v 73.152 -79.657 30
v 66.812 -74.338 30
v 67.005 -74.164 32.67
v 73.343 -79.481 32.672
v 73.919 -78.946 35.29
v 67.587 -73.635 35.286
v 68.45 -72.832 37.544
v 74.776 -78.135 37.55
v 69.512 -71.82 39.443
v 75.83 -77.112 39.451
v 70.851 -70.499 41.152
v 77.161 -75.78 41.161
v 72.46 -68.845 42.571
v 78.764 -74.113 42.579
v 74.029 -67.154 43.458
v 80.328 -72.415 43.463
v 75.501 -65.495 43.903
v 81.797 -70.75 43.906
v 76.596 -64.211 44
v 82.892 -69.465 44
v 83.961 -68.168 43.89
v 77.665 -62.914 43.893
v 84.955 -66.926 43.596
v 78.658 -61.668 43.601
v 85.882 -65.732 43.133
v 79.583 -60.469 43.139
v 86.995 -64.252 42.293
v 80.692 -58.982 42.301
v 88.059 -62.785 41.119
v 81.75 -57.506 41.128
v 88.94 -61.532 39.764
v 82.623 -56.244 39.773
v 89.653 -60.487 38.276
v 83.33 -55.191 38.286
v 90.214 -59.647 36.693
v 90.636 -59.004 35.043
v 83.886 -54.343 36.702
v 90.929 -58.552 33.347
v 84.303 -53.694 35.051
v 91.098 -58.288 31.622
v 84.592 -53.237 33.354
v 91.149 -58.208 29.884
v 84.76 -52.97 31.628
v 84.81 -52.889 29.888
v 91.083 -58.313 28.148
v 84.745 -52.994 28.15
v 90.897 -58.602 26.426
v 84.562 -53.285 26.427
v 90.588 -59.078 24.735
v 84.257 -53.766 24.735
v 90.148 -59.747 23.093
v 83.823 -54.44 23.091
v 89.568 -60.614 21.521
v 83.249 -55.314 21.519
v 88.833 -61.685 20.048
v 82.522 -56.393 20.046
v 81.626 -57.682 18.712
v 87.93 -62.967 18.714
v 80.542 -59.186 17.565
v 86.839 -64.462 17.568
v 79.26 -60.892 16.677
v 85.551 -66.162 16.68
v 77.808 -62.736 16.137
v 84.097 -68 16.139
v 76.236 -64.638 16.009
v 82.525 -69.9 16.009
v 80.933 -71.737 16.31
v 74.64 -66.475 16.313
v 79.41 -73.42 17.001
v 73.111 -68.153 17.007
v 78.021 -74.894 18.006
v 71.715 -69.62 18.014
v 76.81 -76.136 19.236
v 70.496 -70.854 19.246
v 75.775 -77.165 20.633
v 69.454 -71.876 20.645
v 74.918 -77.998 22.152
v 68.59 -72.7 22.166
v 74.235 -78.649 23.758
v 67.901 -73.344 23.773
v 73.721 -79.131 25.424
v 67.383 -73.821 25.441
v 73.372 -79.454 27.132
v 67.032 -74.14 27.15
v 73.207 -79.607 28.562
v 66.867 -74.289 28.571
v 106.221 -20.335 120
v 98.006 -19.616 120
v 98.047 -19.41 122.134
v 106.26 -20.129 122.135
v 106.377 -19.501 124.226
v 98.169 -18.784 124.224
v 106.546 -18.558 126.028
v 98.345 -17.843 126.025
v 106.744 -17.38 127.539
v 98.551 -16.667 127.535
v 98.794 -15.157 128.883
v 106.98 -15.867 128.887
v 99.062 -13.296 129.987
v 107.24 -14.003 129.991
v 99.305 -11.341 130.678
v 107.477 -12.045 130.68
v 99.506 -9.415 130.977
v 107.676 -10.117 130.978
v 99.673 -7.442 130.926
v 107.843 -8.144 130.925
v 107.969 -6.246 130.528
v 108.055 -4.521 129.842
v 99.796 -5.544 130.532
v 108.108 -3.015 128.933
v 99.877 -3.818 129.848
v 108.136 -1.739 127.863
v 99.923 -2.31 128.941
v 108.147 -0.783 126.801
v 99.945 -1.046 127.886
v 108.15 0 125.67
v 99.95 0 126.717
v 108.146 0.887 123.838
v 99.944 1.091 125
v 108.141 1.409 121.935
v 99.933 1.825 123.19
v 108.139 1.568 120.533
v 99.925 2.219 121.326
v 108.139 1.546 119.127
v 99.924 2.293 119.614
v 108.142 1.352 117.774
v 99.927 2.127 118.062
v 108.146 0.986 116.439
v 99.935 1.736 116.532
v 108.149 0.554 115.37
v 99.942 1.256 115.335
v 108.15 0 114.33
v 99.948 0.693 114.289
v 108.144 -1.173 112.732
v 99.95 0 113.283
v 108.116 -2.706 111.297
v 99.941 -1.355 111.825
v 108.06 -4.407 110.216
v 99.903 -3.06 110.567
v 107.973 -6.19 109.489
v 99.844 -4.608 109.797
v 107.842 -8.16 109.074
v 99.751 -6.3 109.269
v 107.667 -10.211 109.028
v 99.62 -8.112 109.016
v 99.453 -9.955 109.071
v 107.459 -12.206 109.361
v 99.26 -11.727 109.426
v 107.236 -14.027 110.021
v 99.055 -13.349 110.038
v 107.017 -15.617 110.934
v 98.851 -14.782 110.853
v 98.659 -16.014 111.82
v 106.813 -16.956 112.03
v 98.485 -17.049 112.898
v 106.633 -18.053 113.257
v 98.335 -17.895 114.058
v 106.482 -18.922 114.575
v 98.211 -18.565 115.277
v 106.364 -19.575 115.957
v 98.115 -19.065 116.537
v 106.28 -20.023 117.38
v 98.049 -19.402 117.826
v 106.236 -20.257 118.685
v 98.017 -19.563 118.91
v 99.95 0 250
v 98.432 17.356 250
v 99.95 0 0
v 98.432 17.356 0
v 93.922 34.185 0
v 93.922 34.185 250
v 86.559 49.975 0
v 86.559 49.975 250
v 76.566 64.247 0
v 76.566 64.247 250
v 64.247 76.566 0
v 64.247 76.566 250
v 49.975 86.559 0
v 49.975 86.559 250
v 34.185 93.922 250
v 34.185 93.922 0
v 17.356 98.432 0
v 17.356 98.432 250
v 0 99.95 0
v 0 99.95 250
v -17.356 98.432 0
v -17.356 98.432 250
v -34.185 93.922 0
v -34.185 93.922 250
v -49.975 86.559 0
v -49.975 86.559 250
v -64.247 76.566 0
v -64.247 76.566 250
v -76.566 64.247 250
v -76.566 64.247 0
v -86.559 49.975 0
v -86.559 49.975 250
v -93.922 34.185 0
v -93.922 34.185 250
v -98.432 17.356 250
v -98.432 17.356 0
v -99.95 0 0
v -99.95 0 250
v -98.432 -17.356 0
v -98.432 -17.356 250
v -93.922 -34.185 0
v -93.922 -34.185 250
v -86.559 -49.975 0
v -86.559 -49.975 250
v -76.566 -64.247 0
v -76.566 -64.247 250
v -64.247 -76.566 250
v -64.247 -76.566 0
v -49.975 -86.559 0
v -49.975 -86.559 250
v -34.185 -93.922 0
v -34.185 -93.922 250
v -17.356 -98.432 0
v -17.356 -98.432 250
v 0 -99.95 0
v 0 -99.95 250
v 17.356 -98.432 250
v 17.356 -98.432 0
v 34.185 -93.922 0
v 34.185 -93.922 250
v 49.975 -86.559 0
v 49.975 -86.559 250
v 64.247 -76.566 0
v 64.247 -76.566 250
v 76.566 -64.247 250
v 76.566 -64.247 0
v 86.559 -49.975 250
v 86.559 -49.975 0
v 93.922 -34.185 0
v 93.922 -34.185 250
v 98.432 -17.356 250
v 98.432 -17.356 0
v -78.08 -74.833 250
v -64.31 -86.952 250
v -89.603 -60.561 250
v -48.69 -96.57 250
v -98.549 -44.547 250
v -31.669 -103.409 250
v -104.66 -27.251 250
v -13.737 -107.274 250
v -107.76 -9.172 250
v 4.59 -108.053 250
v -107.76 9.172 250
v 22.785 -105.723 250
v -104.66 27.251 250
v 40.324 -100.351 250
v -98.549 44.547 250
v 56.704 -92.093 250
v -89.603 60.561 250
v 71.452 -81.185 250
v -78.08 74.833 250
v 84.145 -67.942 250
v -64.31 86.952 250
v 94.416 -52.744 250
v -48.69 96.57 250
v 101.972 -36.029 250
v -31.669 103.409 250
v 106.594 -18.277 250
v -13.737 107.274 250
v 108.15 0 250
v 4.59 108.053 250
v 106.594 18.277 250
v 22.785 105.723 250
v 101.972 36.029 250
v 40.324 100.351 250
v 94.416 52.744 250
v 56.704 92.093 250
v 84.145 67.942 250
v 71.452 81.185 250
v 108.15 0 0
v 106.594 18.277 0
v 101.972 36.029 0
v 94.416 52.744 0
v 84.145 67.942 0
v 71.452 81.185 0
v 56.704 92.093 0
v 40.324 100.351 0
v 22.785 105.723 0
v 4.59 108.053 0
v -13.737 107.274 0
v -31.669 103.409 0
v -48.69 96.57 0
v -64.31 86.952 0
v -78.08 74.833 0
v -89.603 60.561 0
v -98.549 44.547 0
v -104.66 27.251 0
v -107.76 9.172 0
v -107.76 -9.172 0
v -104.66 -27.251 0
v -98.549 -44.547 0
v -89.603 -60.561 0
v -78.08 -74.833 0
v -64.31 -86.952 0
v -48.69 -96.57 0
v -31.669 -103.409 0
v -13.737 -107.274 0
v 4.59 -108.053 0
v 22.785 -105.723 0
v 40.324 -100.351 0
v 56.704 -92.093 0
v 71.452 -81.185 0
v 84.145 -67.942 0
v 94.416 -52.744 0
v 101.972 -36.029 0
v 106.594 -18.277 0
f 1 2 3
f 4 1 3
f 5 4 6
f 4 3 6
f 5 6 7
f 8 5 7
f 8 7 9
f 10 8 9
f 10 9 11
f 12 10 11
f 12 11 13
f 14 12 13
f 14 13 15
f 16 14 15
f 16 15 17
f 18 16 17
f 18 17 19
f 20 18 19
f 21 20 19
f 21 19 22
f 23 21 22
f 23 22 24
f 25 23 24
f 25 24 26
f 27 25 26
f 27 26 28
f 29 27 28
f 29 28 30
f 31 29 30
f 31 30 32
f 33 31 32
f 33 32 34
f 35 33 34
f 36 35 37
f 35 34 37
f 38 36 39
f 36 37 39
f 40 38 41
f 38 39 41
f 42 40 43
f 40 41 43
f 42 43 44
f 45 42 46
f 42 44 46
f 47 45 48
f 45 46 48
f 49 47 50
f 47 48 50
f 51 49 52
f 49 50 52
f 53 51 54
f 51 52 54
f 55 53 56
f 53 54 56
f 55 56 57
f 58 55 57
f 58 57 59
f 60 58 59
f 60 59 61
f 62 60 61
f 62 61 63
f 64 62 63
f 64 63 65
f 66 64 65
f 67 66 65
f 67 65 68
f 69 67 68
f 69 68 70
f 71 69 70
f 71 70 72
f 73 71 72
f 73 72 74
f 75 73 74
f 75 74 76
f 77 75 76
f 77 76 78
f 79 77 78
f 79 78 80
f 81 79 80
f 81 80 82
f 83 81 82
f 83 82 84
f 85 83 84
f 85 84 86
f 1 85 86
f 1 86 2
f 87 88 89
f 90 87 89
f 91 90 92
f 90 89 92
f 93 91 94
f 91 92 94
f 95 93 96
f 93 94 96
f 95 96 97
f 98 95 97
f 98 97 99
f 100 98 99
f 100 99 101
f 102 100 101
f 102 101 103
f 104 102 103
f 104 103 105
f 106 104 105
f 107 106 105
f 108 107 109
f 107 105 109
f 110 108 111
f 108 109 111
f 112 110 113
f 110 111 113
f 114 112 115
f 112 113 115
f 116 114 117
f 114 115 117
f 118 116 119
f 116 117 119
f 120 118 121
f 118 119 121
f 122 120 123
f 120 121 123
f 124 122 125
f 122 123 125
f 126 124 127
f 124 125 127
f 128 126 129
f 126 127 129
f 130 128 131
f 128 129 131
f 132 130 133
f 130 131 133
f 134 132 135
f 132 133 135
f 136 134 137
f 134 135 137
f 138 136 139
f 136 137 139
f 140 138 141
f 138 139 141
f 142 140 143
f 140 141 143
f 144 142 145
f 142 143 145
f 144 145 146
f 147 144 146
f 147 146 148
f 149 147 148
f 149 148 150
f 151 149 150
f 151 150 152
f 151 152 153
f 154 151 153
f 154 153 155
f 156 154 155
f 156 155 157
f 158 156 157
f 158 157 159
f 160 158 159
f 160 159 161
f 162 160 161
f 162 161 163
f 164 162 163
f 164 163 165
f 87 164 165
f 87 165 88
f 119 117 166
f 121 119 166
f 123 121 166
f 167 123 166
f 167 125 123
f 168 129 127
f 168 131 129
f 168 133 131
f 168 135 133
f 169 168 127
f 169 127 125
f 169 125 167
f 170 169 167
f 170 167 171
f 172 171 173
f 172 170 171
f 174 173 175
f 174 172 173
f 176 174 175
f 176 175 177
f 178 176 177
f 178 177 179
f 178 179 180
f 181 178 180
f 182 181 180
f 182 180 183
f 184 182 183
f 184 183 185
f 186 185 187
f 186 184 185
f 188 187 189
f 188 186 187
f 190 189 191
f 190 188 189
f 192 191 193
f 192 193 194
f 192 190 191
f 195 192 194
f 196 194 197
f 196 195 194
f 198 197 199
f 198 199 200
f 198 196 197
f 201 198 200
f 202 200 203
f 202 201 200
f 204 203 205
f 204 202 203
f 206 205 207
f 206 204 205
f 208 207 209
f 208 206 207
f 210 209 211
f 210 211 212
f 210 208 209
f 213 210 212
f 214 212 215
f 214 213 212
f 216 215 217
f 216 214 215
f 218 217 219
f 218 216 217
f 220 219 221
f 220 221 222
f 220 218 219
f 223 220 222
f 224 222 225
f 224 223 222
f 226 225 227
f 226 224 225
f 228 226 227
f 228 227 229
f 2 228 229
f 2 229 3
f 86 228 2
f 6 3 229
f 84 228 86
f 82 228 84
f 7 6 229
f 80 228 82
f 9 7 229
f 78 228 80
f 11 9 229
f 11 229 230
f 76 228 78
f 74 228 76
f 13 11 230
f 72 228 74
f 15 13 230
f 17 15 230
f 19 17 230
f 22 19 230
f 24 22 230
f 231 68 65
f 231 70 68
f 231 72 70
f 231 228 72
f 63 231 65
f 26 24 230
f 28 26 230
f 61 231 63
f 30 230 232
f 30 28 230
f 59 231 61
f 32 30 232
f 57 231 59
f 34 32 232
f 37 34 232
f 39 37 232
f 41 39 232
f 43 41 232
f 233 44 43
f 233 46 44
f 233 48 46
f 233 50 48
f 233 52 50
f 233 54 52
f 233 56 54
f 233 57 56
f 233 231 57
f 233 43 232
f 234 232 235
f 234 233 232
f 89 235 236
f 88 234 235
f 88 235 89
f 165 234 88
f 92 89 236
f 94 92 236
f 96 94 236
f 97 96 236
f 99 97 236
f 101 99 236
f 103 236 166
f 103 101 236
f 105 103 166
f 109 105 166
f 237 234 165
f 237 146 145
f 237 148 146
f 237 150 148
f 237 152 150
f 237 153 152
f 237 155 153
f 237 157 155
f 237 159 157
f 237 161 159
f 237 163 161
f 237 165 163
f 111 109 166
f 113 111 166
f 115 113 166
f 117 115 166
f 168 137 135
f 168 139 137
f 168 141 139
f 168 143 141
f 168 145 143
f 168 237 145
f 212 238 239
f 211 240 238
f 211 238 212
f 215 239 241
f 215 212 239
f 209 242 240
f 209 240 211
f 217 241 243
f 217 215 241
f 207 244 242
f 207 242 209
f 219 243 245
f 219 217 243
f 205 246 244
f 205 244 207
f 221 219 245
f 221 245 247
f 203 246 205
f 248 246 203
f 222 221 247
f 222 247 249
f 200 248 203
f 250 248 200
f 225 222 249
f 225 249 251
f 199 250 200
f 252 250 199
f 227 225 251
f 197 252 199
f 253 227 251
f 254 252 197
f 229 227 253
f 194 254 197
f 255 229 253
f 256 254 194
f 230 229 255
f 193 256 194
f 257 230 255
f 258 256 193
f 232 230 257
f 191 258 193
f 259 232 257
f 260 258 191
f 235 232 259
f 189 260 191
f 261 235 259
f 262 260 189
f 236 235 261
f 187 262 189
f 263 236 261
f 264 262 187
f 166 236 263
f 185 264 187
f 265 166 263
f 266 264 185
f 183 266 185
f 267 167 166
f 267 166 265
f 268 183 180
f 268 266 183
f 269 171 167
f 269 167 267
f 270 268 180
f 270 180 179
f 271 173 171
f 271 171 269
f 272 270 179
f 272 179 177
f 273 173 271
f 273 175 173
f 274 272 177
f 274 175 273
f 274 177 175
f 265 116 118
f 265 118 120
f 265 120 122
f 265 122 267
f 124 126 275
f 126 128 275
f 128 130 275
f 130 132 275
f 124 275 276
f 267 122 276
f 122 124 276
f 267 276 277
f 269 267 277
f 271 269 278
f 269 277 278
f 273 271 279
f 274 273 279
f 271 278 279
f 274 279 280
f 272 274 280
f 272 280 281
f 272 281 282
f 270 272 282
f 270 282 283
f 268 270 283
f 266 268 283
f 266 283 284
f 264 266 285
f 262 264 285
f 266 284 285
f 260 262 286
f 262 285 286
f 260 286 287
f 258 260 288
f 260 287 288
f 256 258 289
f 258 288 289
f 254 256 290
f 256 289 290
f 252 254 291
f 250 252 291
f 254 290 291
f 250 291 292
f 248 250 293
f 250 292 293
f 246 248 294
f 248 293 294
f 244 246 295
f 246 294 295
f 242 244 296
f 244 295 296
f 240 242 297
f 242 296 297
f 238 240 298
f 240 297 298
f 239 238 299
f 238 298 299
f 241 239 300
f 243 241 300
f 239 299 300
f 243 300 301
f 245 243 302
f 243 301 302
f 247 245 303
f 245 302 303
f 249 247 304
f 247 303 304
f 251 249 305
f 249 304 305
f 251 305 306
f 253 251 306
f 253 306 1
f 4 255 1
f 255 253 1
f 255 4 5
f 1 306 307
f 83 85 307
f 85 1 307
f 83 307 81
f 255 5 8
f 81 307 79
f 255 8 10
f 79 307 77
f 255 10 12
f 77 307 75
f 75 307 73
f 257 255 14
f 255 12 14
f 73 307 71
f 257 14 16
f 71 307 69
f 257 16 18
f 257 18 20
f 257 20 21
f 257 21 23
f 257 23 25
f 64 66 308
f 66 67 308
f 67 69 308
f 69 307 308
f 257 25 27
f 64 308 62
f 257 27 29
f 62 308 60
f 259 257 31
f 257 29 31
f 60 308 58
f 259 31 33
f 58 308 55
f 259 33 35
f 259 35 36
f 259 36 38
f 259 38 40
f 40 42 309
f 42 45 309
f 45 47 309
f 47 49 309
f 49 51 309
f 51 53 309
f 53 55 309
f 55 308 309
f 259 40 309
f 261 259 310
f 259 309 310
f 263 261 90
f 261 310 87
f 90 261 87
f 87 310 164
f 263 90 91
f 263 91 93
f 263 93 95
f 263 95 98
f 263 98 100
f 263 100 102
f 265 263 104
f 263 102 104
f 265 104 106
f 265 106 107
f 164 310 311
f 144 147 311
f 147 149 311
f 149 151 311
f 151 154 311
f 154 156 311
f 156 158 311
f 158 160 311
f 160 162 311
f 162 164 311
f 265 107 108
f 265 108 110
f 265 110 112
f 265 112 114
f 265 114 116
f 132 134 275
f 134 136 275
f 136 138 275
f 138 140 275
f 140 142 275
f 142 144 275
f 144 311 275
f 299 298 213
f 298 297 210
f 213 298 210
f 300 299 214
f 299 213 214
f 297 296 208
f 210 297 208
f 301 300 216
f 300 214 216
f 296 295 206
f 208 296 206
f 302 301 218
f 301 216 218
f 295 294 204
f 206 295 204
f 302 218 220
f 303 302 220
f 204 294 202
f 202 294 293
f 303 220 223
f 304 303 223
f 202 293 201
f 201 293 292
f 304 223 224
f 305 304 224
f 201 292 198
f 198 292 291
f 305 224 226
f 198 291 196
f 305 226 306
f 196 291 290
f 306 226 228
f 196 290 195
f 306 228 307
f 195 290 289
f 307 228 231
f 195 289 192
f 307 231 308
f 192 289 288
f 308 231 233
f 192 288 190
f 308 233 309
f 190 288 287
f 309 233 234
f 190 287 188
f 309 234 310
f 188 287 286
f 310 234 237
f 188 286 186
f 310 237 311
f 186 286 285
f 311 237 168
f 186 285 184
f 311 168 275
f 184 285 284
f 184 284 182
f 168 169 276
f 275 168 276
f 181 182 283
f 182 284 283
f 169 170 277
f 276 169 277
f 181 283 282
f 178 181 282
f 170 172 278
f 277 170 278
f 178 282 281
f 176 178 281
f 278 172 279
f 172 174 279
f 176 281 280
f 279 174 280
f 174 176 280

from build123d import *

# Parameters (mm, degrees)
F0_R     = 108.15
F0_R_2   = 99.95
F1_DEPTH = 250
F3_R     = 14
F4_REACH = 191.9641662574
F6_R     = 11
F7_REACH = 148.2780486573


with BuildPart() as f1:
    # F0 (on Top) → F1 (new body)
    with BuildSketch(Plane.XY):
        Circle(F0_R)
        Circle(F0_R_2, mode=Mode.SUBTRACT)
    extrude(amount=F1_DEPTH)

    f4_end = f1.faces().sort_by_distance((-108.15, 0, 125))[0]
    # F3 (on face) → F4 (cut, up to a face of the model that its end follows)
    with BuildSketch(Plane(origin=(0, 0, 0), x_dir=(-0.6427876097, -0.7660444431, 0), z_dir=(-0.7660444431, 0.6427876097, 0))):
        with Locations((0, 30)):
            Circle(F3_R)
    f4_long = extrude(amount=-F4_REACH, mode=Mode.PRIVATE)
    add(split(f4_long, bisect_by=f4_end, keep=Keep.BOTTOM, mode=Mode.PRIVATE), mode=Mode.SUBTRACT)

    f7_end = f1.faces().sort_by_distance((-108.15, 0, 125))[0]
    # F6 (on face) → F7 (cut, up to a face of the model that its end follows)
    with BuildSketch(Plane(origin=(0, 0, 0), x_dir=(-0.0871557427, -0.9961946981, 0), z_dir=(-0.9961946981, 0.0871557427, 0))):
        with Locations((0, 120)):
            Circle(F6_R)
    f7_long = extrude(amount=-F7_REACH, mode=Mode.PRIVATE)
    add(split(f7_long, bisect_by=f7_end, keep=Keep.BOTTOM, mode=Mode.PRIVATE), mode=Mode.SUBTRACT)


solid = f1.part
